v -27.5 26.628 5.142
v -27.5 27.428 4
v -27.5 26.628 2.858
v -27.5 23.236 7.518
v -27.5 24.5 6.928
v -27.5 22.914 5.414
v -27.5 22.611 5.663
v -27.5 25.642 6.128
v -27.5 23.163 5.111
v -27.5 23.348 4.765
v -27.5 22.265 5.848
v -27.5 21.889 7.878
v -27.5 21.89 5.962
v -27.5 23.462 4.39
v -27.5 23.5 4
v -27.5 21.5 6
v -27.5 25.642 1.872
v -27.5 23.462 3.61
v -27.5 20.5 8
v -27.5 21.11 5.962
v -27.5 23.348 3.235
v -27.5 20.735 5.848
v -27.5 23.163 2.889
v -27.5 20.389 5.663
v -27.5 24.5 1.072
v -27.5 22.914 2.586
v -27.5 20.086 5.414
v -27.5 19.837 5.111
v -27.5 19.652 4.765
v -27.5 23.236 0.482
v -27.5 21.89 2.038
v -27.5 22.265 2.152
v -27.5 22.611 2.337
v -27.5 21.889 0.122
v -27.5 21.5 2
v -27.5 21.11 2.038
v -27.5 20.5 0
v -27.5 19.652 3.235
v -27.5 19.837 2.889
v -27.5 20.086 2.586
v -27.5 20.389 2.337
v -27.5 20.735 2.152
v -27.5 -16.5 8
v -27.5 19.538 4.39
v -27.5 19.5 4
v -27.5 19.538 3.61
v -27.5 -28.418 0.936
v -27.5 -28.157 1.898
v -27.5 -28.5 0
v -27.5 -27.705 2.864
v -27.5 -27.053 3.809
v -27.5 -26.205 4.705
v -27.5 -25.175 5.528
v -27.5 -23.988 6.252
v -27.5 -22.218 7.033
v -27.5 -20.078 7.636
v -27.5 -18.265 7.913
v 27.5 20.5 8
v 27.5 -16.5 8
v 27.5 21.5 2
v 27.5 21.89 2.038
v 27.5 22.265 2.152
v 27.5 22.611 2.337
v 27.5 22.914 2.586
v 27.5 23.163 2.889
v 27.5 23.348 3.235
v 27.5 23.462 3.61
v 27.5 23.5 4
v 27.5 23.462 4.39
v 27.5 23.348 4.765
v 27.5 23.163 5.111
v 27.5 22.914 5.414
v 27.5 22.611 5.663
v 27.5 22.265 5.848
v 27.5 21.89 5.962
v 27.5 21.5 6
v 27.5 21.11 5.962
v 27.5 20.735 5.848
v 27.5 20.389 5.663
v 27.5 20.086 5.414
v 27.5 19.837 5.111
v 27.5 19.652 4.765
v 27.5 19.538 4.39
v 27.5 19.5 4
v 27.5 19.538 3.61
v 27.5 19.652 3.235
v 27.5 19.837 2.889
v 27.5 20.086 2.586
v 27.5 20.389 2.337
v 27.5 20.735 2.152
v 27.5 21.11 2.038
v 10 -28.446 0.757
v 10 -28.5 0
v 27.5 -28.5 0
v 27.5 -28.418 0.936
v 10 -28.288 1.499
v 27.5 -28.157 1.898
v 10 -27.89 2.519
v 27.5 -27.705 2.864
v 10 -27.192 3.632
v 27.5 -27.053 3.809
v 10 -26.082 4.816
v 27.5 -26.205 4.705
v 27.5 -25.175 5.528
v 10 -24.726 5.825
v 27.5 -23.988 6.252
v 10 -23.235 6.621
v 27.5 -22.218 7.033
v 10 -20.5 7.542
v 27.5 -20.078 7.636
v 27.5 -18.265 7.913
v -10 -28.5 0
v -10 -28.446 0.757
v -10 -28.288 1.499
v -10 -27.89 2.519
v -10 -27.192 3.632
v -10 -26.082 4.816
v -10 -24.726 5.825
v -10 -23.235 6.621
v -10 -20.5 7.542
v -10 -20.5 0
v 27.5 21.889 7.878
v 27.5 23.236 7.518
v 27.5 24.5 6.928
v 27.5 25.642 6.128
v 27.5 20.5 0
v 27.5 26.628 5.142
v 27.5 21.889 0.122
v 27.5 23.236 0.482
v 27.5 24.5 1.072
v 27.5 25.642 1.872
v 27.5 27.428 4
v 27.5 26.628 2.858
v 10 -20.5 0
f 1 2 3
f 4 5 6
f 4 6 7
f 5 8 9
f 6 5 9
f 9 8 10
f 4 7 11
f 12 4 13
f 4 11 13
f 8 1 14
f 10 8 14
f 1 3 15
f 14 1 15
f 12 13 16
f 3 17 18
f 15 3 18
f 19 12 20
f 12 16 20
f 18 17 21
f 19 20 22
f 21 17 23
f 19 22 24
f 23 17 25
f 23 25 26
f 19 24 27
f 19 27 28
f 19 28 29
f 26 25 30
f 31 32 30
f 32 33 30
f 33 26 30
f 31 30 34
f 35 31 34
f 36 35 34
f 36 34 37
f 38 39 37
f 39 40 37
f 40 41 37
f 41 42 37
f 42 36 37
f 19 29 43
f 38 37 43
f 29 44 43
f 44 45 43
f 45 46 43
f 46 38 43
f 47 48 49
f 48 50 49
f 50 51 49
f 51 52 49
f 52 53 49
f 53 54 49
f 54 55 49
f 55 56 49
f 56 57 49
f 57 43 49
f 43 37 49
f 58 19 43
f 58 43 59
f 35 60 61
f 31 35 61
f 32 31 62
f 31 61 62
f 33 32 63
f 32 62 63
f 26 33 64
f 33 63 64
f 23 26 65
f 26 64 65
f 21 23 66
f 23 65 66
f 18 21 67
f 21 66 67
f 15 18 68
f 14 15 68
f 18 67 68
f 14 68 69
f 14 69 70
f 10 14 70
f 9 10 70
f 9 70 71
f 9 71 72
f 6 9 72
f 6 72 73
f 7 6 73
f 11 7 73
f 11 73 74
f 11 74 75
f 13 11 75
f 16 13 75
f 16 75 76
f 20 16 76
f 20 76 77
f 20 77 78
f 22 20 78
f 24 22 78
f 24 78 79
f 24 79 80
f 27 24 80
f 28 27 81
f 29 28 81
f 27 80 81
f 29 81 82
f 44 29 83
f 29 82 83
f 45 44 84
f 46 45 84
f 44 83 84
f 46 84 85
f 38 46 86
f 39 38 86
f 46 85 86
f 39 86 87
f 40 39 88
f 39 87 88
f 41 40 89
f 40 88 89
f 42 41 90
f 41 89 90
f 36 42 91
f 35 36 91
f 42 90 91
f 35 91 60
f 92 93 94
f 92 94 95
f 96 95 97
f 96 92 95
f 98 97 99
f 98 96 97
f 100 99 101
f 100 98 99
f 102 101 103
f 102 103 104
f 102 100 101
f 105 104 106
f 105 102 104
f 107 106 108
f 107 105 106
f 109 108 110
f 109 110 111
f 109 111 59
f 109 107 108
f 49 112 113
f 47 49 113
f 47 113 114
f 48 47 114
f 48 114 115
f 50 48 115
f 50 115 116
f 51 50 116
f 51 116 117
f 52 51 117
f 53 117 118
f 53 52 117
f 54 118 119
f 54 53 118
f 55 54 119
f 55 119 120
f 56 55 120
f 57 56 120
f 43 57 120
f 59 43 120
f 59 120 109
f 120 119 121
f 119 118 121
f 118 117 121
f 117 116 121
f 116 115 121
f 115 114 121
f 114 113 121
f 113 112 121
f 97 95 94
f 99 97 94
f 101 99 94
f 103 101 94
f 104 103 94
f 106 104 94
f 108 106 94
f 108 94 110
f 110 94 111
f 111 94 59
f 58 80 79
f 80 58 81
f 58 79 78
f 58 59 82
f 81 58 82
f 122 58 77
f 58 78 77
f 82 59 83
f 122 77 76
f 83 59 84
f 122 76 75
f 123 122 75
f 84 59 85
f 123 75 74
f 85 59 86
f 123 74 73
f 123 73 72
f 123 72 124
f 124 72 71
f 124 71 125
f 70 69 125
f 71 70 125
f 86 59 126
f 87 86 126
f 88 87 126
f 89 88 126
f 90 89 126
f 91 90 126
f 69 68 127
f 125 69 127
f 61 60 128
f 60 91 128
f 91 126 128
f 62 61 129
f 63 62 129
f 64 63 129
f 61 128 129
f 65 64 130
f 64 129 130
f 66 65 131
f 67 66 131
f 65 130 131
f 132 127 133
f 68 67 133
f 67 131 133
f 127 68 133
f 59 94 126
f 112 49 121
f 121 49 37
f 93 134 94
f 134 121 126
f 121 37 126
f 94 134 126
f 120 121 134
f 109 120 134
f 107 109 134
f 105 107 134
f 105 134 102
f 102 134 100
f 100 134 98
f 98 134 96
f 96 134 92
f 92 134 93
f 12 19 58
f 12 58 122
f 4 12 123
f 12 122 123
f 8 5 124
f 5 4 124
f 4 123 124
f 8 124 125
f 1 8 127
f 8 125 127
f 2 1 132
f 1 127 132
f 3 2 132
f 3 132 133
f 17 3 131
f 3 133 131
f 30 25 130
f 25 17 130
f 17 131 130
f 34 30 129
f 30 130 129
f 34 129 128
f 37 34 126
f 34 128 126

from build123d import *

# Parameters (mm, degrees)
BOSS_EXTRUDE1_DEPTH = 8
SKETCH2_R           = 2
CUT_EXTRUDE1_DEPTH  = 63.459987192
FILLET3_R           = 8
FILLET4_START       = -27.5
FILLET4_DEPTH       = 55


with BuildPart() as part:
    # Sketch1 → Boss-Extrude1 (new body)
    with BuildSketch(Plane.XY):
        Polygon((-27.5, 28.5), (-27.5, -28.5), (-10, -28.5), (-10, -20.5), (10, -20.5), (10, -28.5), (27.5, -28.5), (27.5, 28.5), align=None)
    extrude(amount=BOSS_EXTRUDE1_DEPTH)

    # Sketch2 → Cut-Extrude1 (cut, through all)
    with BuildSketch(Plane(origin=(27.5, 0, 0), x_dir=(0, 0, -1), z_dir=(1, 0, 0))):
        with Locations((-4, 21.5)):
            Circle(SKETCH2_R)
    extrude(amount=-CUT_EXTRUDE1_DEPTH, mode=Mode.SUBTRACT)

    # Fillet3
    # the kernel refuses this fillet: 8 mm, written as the material it takes off along each edge
    with BuildSketch(Plane(origin=(47.5, 28.5, 8), x_dir=(0, 0, -1), z_dir=(-1, 0, 0))) as fillet3_piece_1:
        with BuildLine():
            CenterArc((FILLET3_R, FILLET3_R), FILLET3_R, 180, 90)
            Line((0, FILLET3_R), (0, 0))
            Line((0, 0), (FILLET3_R, 0))
        make_face()
    extrude(amount=95, mode=Mode.SUBTRACT)
    with BuildSketch(Plane(origin=(47.5, 28.5, 0), x_dir=(0, 0, 1), z_dir=(-1, 0, 0))) as fillet3_piece_2:
        with BuildLine():
            CenterArc((FILLET3_R, -FILLET3_R), FILLET3_R, 90, 90)
            Line((0, -FILLET3_R), (0, 0))
            Line((0, 0), (FILLET3_R, 0))
        make_face()
    extrude(amount=95, mode=Mode.SUBTRACT)

    # Fillet4: read off the stored shape, not the designer's step
    # Fillet4 outline → Fillet4 (cut)
    with BuildSketch(Plane.YZ.offset(FILLET4_START)):
        with BuildLine():
            Line((-28.5, 8), (-28.5, 0))
            add(Edge.make_bspline(
                [(-28.5, 0), (-28.5, 8), (-16.5, 8)],
                knots=[0, 0, 0, 1, 1, 1], degree=2, weights=[1, 0.707106781, 1]))
            Line((-16.5, 8), (-28.5, 8))
        make_face()
    extrude(amount=FILLET4_DEPTH, mode=Mode.SUBTRACT)


solid = part.part
